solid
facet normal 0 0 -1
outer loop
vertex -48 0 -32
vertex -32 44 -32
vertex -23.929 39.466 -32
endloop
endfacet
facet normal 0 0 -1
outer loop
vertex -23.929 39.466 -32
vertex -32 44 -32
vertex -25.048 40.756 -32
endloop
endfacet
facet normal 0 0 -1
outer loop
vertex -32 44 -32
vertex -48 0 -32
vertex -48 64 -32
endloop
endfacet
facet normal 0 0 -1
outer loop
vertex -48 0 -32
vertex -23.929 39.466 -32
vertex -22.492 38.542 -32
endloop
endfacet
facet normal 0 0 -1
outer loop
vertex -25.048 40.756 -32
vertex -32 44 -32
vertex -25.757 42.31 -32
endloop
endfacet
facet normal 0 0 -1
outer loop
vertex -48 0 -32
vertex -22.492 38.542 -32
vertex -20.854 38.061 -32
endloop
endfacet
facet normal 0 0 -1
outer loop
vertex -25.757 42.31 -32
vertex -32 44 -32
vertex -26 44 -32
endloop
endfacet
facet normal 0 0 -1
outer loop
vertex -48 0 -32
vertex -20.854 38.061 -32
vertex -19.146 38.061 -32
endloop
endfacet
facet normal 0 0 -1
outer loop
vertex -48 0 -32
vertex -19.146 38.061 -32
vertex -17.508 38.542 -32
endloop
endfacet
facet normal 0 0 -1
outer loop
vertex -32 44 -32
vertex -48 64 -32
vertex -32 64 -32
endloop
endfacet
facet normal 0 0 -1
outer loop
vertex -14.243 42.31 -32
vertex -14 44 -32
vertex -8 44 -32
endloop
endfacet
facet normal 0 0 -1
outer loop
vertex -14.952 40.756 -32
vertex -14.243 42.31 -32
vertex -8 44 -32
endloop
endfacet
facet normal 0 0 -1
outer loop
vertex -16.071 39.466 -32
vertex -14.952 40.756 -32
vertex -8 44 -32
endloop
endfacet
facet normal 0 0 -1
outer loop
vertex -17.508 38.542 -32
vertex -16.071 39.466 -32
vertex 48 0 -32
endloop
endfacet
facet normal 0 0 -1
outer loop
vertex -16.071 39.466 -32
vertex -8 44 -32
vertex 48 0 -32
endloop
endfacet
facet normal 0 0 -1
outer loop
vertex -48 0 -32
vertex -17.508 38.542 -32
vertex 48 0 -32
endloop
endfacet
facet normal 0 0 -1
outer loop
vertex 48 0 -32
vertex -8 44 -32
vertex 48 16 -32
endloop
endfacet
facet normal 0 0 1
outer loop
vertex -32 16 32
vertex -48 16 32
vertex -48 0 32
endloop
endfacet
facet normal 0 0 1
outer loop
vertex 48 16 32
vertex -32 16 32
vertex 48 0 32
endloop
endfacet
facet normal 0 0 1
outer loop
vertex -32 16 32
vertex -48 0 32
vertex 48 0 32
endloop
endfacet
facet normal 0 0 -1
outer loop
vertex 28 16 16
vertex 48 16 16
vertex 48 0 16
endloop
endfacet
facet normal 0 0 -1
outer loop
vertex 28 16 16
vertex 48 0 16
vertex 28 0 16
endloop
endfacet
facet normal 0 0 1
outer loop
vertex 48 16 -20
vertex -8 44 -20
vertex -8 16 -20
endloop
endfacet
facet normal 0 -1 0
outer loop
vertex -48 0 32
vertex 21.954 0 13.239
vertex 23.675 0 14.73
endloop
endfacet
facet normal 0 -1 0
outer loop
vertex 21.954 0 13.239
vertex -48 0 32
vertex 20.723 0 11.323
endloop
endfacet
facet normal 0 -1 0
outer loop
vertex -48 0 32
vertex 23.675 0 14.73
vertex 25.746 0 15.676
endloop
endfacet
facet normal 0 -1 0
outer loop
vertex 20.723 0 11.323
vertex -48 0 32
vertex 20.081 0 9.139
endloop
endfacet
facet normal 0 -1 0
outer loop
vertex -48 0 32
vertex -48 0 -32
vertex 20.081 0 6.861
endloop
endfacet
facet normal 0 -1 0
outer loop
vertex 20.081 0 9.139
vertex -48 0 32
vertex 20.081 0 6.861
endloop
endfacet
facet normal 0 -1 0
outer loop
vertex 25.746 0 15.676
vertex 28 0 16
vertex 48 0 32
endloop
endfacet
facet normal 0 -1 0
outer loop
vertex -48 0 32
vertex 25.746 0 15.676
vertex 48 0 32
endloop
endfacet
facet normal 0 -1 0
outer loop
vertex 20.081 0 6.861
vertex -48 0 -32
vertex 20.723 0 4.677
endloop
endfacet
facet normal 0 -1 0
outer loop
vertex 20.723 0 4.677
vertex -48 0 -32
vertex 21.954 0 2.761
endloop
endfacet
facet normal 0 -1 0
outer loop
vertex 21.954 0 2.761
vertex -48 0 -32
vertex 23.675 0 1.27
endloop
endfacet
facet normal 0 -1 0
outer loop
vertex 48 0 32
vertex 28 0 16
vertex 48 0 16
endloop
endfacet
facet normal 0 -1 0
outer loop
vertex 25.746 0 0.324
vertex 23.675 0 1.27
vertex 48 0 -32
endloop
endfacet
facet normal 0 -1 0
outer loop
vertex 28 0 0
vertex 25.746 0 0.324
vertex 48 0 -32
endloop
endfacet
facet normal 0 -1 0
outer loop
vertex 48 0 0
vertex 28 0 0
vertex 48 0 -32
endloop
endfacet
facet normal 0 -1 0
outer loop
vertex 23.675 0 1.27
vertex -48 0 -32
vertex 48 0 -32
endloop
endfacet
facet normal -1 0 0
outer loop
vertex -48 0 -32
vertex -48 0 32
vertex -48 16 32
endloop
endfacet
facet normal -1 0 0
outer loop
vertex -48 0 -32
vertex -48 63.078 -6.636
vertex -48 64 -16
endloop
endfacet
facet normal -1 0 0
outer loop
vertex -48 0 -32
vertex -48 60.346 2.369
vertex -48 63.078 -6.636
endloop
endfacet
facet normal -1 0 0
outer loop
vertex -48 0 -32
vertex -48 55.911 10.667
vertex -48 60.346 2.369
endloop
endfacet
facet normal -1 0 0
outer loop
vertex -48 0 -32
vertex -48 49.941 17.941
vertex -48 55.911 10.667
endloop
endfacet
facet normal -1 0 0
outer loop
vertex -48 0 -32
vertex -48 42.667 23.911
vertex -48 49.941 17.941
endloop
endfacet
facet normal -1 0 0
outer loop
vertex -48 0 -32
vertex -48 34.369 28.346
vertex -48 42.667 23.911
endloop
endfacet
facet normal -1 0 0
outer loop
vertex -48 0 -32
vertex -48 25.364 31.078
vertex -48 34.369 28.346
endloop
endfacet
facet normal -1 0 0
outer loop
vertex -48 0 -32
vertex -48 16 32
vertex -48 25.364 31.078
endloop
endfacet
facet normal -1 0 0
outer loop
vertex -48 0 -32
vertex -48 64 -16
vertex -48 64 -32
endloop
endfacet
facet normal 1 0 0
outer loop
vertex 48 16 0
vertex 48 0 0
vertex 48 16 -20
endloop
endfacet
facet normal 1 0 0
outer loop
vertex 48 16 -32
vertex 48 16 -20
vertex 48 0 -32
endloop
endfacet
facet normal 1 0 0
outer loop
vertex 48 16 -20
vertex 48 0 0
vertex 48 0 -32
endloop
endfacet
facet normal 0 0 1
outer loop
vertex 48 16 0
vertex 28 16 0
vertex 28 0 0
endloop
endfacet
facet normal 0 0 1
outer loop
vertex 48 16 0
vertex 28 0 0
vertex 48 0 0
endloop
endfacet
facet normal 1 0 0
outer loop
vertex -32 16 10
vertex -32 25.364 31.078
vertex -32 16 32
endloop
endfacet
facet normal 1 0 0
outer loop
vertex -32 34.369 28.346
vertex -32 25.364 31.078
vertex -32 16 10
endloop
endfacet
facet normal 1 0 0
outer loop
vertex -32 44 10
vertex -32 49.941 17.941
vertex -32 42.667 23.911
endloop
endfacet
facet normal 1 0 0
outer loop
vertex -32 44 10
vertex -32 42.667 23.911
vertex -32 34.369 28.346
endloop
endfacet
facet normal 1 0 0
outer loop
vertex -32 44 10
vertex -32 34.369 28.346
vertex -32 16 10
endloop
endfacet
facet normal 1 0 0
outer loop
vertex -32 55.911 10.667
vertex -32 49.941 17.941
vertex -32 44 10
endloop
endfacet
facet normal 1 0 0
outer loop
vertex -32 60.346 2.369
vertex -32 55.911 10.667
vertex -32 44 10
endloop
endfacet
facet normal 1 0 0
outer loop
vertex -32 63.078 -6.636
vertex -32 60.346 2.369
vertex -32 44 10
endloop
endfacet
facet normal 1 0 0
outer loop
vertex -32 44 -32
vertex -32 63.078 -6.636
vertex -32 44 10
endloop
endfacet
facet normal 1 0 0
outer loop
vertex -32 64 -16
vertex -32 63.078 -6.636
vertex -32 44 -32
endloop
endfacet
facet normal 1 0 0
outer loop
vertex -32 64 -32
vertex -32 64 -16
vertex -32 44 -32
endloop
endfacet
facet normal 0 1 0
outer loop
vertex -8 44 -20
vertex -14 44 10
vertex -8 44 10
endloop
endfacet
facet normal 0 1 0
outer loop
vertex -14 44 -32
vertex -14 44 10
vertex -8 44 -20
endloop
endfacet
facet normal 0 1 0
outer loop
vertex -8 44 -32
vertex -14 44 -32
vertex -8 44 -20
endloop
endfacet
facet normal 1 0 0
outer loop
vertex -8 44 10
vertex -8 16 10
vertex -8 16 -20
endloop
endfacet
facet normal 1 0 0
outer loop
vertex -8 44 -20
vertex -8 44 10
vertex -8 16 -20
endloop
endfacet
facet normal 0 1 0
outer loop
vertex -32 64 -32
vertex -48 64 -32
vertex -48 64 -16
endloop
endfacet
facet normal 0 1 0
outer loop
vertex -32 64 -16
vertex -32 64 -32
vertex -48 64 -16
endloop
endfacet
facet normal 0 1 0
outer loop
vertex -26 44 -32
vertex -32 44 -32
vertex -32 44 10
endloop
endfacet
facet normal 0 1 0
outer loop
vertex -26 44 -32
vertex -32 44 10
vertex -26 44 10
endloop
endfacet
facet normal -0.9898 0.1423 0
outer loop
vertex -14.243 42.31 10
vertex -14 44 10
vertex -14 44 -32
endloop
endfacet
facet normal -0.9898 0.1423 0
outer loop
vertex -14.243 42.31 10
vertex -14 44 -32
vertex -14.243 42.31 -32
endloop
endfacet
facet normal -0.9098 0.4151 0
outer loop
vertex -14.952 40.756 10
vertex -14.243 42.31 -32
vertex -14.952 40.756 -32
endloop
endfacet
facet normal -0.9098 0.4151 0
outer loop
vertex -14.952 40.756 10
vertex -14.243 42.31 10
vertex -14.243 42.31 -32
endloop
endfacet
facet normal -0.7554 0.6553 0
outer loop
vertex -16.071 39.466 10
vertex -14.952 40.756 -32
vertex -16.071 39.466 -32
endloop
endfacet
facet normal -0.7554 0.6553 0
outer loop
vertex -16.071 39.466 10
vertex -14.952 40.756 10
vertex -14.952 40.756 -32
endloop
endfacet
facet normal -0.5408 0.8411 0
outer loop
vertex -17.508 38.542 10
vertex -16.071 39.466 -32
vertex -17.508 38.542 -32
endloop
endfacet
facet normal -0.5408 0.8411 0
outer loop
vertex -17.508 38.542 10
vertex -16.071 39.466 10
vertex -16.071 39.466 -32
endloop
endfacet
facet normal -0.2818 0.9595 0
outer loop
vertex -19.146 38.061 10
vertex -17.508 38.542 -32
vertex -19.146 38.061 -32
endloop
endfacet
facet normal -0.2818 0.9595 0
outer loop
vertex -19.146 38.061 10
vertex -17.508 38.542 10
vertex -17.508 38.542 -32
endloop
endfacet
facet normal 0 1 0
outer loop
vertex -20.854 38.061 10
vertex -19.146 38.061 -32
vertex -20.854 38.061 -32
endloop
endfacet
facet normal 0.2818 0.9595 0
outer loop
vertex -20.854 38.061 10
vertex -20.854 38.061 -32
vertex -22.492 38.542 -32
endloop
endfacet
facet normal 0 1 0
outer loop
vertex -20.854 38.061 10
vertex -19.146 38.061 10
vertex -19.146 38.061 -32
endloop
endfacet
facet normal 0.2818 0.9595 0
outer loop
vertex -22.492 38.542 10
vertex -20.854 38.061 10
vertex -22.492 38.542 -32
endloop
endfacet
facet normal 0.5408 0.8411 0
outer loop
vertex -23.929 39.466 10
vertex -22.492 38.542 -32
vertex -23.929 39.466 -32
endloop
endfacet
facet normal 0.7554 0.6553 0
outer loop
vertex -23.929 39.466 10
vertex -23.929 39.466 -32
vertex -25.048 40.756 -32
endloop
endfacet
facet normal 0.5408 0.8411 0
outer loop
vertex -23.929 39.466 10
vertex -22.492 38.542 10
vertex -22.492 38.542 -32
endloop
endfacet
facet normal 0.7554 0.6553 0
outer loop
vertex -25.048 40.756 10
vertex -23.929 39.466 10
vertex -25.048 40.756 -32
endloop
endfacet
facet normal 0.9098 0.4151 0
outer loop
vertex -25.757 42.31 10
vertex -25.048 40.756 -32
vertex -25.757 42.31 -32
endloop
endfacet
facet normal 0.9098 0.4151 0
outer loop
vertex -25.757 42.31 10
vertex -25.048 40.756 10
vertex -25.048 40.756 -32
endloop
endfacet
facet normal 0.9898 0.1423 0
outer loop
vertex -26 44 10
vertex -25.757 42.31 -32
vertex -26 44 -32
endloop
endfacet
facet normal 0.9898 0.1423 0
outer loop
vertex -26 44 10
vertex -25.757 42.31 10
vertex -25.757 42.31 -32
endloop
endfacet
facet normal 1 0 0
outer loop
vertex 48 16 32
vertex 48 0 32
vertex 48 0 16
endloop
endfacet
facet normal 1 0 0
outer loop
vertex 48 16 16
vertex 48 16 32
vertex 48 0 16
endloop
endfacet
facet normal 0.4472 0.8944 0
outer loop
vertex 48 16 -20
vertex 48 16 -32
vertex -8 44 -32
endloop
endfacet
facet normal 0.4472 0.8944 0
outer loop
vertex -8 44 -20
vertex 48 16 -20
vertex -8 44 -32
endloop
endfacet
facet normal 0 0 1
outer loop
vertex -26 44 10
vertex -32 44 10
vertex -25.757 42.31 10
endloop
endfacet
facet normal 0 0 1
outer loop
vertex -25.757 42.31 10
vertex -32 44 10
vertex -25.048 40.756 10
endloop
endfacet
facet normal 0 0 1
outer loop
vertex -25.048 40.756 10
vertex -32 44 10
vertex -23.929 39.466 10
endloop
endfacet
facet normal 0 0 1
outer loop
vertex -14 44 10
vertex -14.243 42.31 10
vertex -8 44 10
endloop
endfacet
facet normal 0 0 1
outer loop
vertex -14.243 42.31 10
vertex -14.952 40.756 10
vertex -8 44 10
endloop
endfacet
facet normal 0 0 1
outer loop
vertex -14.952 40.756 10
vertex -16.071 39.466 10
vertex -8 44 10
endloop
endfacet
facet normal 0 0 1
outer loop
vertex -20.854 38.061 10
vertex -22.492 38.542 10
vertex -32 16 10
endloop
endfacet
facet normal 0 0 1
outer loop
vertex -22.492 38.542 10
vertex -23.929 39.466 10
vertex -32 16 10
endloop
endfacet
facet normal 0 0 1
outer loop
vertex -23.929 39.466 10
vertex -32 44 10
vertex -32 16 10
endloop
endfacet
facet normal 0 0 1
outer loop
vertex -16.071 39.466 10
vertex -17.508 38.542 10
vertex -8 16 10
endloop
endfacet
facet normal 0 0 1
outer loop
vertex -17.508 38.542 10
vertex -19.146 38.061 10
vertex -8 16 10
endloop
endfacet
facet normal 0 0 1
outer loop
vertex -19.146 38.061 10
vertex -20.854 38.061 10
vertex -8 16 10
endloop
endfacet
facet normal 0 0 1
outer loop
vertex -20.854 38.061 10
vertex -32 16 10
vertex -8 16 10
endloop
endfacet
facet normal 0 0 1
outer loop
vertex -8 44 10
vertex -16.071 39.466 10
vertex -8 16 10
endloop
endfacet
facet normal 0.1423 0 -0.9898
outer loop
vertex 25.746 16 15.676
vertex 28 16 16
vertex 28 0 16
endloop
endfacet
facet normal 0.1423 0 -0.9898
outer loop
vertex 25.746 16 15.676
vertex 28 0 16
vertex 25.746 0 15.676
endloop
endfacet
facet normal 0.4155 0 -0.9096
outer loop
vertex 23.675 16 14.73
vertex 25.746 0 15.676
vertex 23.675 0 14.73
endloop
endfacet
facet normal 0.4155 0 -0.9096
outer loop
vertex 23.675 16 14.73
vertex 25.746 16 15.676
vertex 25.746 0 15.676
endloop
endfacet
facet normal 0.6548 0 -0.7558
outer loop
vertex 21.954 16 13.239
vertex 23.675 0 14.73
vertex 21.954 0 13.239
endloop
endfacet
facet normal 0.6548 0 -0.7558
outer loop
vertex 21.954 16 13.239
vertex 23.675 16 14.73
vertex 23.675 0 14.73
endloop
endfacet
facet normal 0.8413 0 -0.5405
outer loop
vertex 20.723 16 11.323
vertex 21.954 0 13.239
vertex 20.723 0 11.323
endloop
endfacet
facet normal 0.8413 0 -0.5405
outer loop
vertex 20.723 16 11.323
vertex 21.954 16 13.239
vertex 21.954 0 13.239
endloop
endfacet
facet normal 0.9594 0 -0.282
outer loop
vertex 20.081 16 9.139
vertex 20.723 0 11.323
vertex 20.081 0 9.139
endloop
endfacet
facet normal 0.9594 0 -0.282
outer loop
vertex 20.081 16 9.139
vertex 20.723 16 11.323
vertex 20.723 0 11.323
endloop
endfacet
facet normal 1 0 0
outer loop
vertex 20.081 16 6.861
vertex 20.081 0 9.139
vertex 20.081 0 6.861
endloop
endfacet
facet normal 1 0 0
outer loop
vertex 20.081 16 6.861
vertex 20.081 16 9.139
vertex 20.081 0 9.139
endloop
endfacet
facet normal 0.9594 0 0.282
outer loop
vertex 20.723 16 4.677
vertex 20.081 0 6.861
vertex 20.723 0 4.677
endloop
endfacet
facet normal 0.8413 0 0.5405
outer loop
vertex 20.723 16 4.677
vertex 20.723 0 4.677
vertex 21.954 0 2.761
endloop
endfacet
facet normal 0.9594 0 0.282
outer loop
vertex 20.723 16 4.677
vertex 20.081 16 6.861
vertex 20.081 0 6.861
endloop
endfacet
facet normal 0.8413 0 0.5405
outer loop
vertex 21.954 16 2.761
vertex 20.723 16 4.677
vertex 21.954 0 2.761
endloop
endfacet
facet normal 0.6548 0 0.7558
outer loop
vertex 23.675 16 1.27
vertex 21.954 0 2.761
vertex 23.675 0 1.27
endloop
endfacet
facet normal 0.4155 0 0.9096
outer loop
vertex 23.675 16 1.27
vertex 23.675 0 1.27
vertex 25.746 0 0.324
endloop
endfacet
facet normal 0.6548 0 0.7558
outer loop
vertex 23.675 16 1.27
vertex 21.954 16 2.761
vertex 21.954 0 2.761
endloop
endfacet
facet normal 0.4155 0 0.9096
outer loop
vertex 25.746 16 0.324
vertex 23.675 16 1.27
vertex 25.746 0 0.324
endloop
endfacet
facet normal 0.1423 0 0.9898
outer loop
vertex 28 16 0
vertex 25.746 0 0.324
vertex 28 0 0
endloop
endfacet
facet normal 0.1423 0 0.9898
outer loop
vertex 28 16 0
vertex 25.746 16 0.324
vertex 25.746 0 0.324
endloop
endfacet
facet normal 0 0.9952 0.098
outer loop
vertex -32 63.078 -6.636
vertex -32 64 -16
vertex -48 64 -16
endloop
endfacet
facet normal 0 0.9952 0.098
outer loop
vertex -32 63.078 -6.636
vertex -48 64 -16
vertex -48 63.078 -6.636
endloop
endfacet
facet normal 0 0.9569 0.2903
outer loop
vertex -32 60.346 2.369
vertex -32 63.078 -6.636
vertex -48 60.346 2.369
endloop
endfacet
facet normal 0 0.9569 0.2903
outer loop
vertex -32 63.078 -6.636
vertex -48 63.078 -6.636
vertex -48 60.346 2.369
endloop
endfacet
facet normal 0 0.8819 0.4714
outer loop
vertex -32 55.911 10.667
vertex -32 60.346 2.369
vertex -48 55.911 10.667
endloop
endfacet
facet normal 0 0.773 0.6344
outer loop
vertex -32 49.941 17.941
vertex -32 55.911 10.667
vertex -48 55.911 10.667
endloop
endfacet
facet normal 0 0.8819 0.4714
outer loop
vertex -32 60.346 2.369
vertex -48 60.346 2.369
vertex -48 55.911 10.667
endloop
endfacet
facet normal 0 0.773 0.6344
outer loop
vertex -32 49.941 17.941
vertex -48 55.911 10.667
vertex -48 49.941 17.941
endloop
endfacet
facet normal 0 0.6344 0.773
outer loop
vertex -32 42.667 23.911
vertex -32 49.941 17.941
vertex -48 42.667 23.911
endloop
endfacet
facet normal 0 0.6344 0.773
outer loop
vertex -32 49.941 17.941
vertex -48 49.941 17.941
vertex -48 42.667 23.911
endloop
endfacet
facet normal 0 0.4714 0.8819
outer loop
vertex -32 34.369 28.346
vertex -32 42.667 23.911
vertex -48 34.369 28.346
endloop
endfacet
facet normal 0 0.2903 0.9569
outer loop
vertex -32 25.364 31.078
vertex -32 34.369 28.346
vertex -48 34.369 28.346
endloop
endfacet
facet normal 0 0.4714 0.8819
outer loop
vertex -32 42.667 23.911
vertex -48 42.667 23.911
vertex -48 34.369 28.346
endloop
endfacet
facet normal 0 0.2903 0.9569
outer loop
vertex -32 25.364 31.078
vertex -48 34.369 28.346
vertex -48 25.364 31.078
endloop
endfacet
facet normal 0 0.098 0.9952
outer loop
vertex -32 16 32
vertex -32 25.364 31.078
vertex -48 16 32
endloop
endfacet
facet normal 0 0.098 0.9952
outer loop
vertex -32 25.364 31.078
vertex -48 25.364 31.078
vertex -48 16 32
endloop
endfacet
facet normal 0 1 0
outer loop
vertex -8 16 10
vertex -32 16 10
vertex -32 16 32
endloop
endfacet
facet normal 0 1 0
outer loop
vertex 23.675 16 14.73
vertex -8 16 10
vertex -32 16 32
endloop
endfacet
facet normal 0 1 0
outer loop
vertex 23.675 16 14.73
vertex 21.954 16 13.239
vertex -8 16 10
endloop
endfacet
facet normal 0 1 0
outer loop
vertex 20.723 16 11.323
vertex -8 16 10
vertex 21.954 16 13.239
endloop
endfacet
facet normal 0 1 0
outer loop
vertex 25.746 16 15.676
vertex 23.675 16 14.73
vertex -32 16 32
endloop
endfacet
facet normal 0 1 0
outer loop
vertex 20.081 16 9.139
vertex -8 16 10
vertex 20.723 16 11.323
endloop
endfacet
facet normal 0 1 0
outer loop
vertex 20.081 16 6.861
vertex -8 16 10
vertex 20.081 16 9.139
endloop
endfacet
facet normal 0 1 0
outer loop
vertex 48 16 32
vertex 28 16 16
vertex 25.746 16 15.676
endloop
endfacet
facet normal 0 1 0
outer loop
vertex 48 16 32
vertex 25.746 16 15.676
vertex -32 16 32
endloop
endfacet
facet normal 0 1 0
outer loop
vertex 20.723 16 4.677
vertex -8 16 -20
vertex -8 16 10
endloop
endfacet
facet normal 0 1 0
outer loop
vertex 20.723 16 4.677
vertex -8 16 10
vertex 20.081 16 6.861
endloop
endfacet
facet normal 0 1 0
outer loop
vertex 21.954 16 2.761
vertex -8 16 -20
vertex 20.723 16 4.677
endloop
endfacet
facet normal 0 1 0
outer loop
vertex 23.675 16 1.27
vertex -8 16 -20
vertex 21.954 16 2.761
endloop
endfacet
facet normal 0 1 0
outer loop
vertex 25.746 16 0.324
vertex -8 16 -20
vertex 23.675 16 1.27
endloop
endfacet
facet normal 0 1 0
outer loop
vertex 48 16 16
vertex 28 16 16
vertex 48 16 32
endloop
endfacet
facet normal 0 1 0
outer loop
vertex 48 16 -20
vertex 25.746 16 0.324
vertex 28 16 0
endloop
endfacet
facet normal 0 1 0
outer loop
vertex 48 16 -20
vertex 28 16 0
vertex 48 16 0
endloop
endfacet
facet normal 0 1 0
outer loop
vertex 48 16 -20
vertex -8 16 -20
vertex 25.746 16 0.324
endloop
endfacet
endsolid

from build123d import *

# Parameters (mm, degrees)
SKETCH2_W           = 96
SKETCH2_H           = 64
BOSS_EXTRUDE1_DEPTH = 16
CUT_EXTRUDE1_DEPTH  = 16
BOSS_EXTRUDE2_DEPTH = 16
SKETCH11_W          = 24
SKETCH11_H          = 42
BOSS_EXTRUDE3_DEPTH = 28
BOSS_EXTRUDE4_DEPTH = 12
CUT_EXTRUDE2_START  = -42
SKETCH16_R          = 6
CUT_EXTRUDE2_DEPTH  = 42


with BuildPart() as part:
    # Sketch2 → Boss-Extrude1 (new body)
    with BuildSketch(Plane(origin=(0, 0, 0), x_dir=(1, 0, 0), z_dir=(0, 1, 0))):
        Rectangle(SKETCH2_W, SKETCH2_H)
    extrude(amount=BOSS_EXTRUDE1_DEPTH)

    # Sketch5 → Cut-Extrude1 (cut)
    with BuildSketch(Plane(origin=(0, 16, 0), x_dir=(1, 0, 0), z_dir=(0, 1, 0))):
        with BuildLine():
            Line((48, -16), (28, -16))
            ThreePointArc((28, -16), (20, -8), (28, 0))
            Line((28, 0), (48, 0))
            ThreePointArc((48, 0), (56, -8), (48, -16))
        make_face()
    extrude(amount=-CUT_EXTRUDE1_DEPTH, mode=Mode.SUBTRACT)

    # Sketch10 → Boss-Extrude2 (add)
    with BuildSketch(Plane.ZY.offset(48)):
        with BuildLine():
            Line((32, 0), (-32, 0))
            Line((-32, 0), (-32, 64))
            Line((-32, 64), (-16, 64))
            ThreePointArc((-16, 64), (17.941125497, 49.941125497), (32, 16))
            Line((32, 16), (32, 0))
        make_face()
    extrude(amount=-BOSS_EXTRUDE2_DEPTH)

    # Sketch11 → Boss-Extrude3 (add)
    with BuildSketch(Plane(origin=(0, 16, 0), x_dir=(1, 0, 0), z_dir=(0, 1, 0))):
        with Locations((-20, 11)):
            Rectangle(SKETCH11_W, SKETCH11_H)
    extrude(amount=BOSS_EXTRUDE3_DEPTH)

    # Sketch15 → Boss-Extrude4 (add)
    with BuildSketch(Plane(origin=(0, 0, -32), x_dir=(-1, 0, 0), z_dir=(0, 0, -1))):
        Polygon((-48, 16), (8, 44), (8, 16), align=None)
    extrude(amount=-BOSS_EXTRUDE4_DEPTH)

    # Sketch16 → Cut-Extrude2 (cut)
    with BuildSketch(Plane(origin=(0, 0, -32), x_dir=(-1, 0, 0), z_dir=(0, 0, -1)).offset(CUT_EXTRUDE2_START)):
        with Locations((20, 44)):
            Circle(SKETCH16_R)
    extrude(amount=CUT_EXTRUDE2_DEPTH, mode=Mode.SUBTRACT)


solid = part.part
